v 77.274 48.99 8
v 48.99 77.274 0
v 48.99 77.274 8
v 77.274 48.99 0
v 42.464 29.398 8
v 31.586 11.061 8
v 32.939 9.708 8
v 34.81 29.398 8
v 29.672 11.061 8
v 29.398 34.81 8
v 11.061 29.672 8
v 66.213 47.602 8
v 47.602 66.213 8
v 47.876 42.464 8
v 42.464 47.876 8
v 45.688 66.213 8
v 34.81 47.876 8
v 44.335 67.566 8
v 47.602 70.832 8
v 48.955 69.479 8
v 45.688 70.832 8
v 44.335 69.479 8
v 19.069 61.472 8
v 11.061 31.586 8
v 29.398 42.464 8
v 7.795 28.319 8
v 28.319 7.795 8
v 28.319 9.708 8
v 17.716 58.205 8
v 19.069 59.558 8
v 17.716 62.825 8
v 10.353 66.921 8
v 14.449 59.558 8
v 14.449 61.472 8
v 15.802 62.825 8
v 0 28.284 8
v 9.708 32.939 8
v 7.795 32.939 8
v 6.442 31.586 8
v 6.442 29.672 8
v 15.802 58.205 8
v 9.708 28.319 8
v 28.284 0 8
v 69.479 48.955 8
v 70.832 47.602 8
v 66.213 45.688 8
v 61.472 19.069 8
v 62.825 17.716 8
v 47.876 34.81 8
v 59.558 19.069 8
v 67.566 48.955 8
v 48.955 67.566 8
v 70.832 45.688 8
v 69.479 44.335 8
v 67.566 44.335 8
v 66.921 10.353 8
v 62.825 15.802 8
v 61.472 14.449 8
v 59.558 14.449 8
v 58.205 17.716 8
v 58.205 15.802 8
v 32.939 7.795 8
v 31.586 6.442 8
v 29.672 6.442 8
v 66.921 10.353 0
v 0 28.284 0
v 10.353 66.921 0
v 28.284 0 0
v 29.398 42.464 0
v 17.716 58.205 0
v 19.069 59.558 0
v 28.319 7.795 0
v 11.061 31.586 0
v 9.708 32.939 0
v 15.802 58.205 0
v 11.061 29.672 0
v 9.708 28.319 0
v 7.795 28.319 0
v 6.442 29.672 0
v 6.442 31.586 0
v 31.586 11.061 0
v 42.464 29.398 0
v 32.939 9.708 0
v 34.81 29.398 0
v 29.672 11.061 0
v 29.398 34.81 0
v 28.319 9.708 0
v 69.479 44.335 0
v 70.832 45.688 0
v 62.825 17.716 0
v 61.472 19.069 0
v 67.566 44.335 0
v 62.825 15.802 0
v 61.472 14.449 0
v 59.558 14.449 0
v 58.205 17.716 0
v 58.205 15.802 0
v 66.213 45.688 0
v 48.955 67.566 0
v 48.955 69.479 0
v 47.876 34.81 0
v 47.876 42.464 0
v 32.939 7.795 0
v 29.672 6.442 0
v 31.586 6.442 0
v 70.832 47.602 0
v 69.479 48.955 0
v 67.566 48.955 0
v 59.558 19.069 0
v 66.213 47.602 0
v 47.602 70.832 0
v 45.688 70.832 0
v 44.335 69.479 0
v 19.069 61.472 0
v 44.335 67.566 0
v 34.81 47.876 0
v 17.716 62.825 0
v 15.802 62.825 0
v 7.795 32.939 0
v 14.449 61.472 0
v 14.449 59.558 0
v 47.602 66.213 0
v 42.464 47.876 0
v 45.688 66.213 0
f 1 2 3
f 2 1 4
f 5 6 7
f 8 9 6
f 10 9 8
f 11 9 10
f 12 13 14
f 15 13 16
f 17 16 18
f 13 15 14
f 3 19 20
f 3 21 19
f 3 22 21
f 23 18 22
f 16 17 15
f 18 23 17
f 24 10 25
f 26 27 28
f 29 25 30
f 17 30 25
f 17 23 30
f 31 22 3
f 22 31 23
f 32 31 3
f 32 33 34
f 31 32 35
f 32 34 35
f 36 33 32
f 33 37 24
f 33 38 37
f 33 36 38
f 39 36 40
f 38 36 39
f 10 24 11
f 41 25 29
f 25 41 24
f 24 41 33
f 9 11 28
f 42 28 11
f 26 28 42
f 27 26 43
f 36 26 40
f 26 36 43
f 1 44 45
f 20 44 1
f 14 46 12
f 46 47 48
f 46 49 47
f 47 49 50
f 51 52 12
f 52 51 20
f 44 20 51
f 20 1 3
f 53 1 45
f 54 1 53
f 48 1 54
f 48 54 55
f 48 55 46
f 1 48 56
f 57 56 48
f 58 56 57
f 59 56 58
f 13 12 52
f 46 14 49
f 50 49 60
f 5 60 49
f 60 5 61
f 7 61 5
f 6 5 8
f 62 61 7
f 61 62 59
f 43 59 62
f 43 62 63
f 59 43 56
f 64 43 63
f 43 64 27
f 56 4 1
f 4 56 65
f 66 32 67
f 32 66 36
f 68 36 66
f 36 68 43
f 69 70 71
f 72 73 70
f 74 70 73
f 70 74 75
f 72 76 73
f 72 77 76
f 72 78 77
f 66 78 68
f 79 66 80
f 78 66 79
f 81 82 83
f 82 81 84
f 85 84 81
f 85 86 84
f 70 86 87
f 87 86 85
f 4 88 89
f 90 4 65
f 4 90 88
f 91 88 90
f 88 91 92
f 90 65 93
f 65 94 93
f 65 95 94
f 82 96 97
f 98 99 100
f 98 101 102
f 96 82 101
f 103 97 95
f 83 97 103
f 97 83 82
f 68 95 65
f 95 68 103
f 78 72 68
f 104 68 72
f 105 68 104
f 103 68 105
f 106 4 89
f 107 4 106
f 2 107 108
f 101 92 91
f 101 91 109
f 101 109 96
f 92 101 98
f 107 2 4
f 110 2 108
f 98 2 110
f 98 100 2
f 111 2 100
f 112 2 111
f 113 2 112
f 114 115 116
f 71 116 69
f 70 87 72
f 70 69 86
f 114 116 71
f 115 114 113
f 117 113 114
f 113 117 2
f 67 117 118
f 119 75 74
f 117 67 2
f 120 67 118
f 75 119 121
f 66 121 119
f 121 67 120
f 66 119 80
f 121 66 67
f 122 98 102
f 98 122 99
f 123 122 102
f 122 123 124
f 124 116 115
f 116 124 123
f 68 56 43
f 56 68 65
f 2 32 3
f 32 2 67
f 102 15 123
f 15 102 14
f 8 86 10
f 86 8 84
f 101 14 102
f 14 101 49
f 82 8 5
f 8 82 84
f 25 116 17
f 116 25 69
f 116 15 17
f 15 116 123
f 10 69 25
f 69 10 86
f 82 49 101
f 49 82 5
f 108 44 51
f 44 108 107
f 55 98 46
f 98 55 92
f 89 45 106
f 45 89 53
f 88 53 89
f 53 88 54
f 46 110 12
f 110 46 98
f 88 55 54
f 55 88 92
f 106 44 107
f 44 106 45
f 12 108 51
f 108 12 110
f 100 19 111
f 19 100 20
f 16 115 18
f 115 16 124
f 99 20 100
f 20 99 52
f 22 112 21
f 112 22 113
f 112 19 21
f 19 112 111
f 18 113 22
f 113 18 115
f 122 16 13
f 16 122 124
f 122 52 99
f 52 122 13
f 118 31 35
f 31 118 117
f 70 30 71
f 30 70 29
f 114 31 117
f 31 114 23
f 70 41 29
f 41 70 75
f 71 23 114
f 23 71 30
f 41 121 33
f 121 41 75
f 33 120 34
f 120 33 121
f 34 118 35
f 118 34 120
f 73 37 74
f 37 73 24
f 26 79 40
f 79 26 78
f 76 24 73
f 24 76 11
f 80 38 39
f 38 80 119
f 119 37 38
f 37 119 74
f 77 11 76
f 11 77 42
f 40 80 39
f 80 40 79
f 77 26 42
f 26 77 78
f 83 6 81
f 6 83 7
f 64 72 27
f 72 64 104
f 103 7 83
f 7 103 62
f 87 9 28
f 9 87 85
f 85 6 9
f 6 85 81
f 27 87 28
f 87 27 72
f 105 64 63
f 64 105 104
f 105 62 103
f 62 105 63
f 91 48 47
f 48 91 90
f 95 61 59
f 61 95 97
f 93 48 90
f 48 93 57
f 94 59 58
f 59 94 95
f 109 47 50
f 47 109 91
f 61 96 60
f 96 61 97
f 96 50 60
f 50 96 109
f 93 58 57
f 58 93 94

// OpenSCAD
$fn = 32;

// ----------------------------------------------------------------------
// Polygon plate: 6-gon R40, 6 bolt windows
// ----------------------------------------------------------------------

// --- parameters (mm) ---
sides = 6;                // number of polygon sides
plate_r = 40;             // circumscribed radius of the polygon
bore_r = 10;              // centre bore radius
bolts = 6;                // number of bolt windows
ring_r = 30.94;           // bolt-circle radius
bolt_r = 2.5;             // bolt window radius
plate_t = 8;              // plate thickness, Z (extrusion height)
fit_tol = 0.05;           // declared fit tolerance (prompt contract)
free_tol = 0.2;           // declared free tolerance (prompt contract)

plate_d = 2 * plate_r;  // circumscribed diameter
bore_d = 2 * bore_r;  // centre bore diameter
bolt_d = 2 * bolt_r;  // bolt window diameter
ring_d = 2 * ring_r;  // bolt-circle diameter

profile = [[77.274, 48.99], [48.99, 77.274], [10.353, 66.921], [0, 28.284], [28.284, 0], [66.921, 10.353]];  // primary outline, 6 points, counter clockwise
void_1 = [[47.876, 42.464], [42.464, 47.876], [34.81, 47.876], [29.398, 42.464], [29.398, 34.81], [34.81, 29.398], [42.464, 29.398], [47.876, 34.81]];  // centre bore, 8 points
void_2 = [[70.832, 47.602], [69.479, 48.955], [67.566, 48.955], [66.213, 47.602], [66.213, 45.688], [67.566, 44.335], [69.479, 44.335], [70.832, 45.688]];  // bolt window 1, 8 points
void_3 = [[48.955, 69.479], [47.602, 70.832], [45.688, 70.832], [44.335, 69.479], [44.335, 67.566], [45.688, 66.213], [47.602, 66.213], [48.955, 67.566]];  // bolt window 2, 8 points
void_4 = [[19.069, 61.472], [17.716, 62.825], [15.802, 62.825], [14.449, 61.472], [14.449, 59.558], [15.802, 58.205], [17.716, 58.205], [19.069, 59.558]];  // bolt window 3, 8 points
void_5 = [[11.061, 31.586], [9.708, 32.939], [7.795, 32.939], [6.442, 31.586], [6.442, 29.672], [7.795, 28.319], [9.708, 28.319], [11.061, 29.672]];  // bolt window 4, 8 points
void_6 = [[32.939, 9.708], [31.586, 11.061], [29.672, 11.061], [28.319, 9.708], [28.319, 7.795], [29.672, 6.442], [31.586, 6.442], [32.939, 7.795]];  // bolt window 5, 8 points
void_7 = [[62.825, 17.716], [61.472, 19.069], [59.558, 19.069], [58.205, 17.716], [58.205, 15.802], [59.558, 14.449], [61.472, 14.449], [62.825, 15.802]];  // bolt window 6, 8 points

// --- the one profile operation ---
difference() {
  linear_extrude(height = plate_t) polygon(points = profile);
  translate([0, 0, -1])
    linear_extrude(height = plate_t + 2) polygon(points = void_1);
  translate([0, 0, -1])
    linear_extrude(height = plate_t + 2) polygon(points = void_2);
  translate([0, 0, -1])
    linear_extrude(height = plate_t + 2) polygon(points = void_3);
  translate([0, 0, -1])
    linear_extrude(height = plate_t + 2) polygon(points = void_4);
  translate([0, 0, -1])
    linear_extrude(height = plate_t + 2) polygon(points = void_5);
  translate([0, 0, -1])
    linear_extrude(height = plate_t + 2) polygon(points = void_6);
  translate([0, 0, -1])
    linear_extrude(height = plate_t + 2) polygon(points = void_7);
}
